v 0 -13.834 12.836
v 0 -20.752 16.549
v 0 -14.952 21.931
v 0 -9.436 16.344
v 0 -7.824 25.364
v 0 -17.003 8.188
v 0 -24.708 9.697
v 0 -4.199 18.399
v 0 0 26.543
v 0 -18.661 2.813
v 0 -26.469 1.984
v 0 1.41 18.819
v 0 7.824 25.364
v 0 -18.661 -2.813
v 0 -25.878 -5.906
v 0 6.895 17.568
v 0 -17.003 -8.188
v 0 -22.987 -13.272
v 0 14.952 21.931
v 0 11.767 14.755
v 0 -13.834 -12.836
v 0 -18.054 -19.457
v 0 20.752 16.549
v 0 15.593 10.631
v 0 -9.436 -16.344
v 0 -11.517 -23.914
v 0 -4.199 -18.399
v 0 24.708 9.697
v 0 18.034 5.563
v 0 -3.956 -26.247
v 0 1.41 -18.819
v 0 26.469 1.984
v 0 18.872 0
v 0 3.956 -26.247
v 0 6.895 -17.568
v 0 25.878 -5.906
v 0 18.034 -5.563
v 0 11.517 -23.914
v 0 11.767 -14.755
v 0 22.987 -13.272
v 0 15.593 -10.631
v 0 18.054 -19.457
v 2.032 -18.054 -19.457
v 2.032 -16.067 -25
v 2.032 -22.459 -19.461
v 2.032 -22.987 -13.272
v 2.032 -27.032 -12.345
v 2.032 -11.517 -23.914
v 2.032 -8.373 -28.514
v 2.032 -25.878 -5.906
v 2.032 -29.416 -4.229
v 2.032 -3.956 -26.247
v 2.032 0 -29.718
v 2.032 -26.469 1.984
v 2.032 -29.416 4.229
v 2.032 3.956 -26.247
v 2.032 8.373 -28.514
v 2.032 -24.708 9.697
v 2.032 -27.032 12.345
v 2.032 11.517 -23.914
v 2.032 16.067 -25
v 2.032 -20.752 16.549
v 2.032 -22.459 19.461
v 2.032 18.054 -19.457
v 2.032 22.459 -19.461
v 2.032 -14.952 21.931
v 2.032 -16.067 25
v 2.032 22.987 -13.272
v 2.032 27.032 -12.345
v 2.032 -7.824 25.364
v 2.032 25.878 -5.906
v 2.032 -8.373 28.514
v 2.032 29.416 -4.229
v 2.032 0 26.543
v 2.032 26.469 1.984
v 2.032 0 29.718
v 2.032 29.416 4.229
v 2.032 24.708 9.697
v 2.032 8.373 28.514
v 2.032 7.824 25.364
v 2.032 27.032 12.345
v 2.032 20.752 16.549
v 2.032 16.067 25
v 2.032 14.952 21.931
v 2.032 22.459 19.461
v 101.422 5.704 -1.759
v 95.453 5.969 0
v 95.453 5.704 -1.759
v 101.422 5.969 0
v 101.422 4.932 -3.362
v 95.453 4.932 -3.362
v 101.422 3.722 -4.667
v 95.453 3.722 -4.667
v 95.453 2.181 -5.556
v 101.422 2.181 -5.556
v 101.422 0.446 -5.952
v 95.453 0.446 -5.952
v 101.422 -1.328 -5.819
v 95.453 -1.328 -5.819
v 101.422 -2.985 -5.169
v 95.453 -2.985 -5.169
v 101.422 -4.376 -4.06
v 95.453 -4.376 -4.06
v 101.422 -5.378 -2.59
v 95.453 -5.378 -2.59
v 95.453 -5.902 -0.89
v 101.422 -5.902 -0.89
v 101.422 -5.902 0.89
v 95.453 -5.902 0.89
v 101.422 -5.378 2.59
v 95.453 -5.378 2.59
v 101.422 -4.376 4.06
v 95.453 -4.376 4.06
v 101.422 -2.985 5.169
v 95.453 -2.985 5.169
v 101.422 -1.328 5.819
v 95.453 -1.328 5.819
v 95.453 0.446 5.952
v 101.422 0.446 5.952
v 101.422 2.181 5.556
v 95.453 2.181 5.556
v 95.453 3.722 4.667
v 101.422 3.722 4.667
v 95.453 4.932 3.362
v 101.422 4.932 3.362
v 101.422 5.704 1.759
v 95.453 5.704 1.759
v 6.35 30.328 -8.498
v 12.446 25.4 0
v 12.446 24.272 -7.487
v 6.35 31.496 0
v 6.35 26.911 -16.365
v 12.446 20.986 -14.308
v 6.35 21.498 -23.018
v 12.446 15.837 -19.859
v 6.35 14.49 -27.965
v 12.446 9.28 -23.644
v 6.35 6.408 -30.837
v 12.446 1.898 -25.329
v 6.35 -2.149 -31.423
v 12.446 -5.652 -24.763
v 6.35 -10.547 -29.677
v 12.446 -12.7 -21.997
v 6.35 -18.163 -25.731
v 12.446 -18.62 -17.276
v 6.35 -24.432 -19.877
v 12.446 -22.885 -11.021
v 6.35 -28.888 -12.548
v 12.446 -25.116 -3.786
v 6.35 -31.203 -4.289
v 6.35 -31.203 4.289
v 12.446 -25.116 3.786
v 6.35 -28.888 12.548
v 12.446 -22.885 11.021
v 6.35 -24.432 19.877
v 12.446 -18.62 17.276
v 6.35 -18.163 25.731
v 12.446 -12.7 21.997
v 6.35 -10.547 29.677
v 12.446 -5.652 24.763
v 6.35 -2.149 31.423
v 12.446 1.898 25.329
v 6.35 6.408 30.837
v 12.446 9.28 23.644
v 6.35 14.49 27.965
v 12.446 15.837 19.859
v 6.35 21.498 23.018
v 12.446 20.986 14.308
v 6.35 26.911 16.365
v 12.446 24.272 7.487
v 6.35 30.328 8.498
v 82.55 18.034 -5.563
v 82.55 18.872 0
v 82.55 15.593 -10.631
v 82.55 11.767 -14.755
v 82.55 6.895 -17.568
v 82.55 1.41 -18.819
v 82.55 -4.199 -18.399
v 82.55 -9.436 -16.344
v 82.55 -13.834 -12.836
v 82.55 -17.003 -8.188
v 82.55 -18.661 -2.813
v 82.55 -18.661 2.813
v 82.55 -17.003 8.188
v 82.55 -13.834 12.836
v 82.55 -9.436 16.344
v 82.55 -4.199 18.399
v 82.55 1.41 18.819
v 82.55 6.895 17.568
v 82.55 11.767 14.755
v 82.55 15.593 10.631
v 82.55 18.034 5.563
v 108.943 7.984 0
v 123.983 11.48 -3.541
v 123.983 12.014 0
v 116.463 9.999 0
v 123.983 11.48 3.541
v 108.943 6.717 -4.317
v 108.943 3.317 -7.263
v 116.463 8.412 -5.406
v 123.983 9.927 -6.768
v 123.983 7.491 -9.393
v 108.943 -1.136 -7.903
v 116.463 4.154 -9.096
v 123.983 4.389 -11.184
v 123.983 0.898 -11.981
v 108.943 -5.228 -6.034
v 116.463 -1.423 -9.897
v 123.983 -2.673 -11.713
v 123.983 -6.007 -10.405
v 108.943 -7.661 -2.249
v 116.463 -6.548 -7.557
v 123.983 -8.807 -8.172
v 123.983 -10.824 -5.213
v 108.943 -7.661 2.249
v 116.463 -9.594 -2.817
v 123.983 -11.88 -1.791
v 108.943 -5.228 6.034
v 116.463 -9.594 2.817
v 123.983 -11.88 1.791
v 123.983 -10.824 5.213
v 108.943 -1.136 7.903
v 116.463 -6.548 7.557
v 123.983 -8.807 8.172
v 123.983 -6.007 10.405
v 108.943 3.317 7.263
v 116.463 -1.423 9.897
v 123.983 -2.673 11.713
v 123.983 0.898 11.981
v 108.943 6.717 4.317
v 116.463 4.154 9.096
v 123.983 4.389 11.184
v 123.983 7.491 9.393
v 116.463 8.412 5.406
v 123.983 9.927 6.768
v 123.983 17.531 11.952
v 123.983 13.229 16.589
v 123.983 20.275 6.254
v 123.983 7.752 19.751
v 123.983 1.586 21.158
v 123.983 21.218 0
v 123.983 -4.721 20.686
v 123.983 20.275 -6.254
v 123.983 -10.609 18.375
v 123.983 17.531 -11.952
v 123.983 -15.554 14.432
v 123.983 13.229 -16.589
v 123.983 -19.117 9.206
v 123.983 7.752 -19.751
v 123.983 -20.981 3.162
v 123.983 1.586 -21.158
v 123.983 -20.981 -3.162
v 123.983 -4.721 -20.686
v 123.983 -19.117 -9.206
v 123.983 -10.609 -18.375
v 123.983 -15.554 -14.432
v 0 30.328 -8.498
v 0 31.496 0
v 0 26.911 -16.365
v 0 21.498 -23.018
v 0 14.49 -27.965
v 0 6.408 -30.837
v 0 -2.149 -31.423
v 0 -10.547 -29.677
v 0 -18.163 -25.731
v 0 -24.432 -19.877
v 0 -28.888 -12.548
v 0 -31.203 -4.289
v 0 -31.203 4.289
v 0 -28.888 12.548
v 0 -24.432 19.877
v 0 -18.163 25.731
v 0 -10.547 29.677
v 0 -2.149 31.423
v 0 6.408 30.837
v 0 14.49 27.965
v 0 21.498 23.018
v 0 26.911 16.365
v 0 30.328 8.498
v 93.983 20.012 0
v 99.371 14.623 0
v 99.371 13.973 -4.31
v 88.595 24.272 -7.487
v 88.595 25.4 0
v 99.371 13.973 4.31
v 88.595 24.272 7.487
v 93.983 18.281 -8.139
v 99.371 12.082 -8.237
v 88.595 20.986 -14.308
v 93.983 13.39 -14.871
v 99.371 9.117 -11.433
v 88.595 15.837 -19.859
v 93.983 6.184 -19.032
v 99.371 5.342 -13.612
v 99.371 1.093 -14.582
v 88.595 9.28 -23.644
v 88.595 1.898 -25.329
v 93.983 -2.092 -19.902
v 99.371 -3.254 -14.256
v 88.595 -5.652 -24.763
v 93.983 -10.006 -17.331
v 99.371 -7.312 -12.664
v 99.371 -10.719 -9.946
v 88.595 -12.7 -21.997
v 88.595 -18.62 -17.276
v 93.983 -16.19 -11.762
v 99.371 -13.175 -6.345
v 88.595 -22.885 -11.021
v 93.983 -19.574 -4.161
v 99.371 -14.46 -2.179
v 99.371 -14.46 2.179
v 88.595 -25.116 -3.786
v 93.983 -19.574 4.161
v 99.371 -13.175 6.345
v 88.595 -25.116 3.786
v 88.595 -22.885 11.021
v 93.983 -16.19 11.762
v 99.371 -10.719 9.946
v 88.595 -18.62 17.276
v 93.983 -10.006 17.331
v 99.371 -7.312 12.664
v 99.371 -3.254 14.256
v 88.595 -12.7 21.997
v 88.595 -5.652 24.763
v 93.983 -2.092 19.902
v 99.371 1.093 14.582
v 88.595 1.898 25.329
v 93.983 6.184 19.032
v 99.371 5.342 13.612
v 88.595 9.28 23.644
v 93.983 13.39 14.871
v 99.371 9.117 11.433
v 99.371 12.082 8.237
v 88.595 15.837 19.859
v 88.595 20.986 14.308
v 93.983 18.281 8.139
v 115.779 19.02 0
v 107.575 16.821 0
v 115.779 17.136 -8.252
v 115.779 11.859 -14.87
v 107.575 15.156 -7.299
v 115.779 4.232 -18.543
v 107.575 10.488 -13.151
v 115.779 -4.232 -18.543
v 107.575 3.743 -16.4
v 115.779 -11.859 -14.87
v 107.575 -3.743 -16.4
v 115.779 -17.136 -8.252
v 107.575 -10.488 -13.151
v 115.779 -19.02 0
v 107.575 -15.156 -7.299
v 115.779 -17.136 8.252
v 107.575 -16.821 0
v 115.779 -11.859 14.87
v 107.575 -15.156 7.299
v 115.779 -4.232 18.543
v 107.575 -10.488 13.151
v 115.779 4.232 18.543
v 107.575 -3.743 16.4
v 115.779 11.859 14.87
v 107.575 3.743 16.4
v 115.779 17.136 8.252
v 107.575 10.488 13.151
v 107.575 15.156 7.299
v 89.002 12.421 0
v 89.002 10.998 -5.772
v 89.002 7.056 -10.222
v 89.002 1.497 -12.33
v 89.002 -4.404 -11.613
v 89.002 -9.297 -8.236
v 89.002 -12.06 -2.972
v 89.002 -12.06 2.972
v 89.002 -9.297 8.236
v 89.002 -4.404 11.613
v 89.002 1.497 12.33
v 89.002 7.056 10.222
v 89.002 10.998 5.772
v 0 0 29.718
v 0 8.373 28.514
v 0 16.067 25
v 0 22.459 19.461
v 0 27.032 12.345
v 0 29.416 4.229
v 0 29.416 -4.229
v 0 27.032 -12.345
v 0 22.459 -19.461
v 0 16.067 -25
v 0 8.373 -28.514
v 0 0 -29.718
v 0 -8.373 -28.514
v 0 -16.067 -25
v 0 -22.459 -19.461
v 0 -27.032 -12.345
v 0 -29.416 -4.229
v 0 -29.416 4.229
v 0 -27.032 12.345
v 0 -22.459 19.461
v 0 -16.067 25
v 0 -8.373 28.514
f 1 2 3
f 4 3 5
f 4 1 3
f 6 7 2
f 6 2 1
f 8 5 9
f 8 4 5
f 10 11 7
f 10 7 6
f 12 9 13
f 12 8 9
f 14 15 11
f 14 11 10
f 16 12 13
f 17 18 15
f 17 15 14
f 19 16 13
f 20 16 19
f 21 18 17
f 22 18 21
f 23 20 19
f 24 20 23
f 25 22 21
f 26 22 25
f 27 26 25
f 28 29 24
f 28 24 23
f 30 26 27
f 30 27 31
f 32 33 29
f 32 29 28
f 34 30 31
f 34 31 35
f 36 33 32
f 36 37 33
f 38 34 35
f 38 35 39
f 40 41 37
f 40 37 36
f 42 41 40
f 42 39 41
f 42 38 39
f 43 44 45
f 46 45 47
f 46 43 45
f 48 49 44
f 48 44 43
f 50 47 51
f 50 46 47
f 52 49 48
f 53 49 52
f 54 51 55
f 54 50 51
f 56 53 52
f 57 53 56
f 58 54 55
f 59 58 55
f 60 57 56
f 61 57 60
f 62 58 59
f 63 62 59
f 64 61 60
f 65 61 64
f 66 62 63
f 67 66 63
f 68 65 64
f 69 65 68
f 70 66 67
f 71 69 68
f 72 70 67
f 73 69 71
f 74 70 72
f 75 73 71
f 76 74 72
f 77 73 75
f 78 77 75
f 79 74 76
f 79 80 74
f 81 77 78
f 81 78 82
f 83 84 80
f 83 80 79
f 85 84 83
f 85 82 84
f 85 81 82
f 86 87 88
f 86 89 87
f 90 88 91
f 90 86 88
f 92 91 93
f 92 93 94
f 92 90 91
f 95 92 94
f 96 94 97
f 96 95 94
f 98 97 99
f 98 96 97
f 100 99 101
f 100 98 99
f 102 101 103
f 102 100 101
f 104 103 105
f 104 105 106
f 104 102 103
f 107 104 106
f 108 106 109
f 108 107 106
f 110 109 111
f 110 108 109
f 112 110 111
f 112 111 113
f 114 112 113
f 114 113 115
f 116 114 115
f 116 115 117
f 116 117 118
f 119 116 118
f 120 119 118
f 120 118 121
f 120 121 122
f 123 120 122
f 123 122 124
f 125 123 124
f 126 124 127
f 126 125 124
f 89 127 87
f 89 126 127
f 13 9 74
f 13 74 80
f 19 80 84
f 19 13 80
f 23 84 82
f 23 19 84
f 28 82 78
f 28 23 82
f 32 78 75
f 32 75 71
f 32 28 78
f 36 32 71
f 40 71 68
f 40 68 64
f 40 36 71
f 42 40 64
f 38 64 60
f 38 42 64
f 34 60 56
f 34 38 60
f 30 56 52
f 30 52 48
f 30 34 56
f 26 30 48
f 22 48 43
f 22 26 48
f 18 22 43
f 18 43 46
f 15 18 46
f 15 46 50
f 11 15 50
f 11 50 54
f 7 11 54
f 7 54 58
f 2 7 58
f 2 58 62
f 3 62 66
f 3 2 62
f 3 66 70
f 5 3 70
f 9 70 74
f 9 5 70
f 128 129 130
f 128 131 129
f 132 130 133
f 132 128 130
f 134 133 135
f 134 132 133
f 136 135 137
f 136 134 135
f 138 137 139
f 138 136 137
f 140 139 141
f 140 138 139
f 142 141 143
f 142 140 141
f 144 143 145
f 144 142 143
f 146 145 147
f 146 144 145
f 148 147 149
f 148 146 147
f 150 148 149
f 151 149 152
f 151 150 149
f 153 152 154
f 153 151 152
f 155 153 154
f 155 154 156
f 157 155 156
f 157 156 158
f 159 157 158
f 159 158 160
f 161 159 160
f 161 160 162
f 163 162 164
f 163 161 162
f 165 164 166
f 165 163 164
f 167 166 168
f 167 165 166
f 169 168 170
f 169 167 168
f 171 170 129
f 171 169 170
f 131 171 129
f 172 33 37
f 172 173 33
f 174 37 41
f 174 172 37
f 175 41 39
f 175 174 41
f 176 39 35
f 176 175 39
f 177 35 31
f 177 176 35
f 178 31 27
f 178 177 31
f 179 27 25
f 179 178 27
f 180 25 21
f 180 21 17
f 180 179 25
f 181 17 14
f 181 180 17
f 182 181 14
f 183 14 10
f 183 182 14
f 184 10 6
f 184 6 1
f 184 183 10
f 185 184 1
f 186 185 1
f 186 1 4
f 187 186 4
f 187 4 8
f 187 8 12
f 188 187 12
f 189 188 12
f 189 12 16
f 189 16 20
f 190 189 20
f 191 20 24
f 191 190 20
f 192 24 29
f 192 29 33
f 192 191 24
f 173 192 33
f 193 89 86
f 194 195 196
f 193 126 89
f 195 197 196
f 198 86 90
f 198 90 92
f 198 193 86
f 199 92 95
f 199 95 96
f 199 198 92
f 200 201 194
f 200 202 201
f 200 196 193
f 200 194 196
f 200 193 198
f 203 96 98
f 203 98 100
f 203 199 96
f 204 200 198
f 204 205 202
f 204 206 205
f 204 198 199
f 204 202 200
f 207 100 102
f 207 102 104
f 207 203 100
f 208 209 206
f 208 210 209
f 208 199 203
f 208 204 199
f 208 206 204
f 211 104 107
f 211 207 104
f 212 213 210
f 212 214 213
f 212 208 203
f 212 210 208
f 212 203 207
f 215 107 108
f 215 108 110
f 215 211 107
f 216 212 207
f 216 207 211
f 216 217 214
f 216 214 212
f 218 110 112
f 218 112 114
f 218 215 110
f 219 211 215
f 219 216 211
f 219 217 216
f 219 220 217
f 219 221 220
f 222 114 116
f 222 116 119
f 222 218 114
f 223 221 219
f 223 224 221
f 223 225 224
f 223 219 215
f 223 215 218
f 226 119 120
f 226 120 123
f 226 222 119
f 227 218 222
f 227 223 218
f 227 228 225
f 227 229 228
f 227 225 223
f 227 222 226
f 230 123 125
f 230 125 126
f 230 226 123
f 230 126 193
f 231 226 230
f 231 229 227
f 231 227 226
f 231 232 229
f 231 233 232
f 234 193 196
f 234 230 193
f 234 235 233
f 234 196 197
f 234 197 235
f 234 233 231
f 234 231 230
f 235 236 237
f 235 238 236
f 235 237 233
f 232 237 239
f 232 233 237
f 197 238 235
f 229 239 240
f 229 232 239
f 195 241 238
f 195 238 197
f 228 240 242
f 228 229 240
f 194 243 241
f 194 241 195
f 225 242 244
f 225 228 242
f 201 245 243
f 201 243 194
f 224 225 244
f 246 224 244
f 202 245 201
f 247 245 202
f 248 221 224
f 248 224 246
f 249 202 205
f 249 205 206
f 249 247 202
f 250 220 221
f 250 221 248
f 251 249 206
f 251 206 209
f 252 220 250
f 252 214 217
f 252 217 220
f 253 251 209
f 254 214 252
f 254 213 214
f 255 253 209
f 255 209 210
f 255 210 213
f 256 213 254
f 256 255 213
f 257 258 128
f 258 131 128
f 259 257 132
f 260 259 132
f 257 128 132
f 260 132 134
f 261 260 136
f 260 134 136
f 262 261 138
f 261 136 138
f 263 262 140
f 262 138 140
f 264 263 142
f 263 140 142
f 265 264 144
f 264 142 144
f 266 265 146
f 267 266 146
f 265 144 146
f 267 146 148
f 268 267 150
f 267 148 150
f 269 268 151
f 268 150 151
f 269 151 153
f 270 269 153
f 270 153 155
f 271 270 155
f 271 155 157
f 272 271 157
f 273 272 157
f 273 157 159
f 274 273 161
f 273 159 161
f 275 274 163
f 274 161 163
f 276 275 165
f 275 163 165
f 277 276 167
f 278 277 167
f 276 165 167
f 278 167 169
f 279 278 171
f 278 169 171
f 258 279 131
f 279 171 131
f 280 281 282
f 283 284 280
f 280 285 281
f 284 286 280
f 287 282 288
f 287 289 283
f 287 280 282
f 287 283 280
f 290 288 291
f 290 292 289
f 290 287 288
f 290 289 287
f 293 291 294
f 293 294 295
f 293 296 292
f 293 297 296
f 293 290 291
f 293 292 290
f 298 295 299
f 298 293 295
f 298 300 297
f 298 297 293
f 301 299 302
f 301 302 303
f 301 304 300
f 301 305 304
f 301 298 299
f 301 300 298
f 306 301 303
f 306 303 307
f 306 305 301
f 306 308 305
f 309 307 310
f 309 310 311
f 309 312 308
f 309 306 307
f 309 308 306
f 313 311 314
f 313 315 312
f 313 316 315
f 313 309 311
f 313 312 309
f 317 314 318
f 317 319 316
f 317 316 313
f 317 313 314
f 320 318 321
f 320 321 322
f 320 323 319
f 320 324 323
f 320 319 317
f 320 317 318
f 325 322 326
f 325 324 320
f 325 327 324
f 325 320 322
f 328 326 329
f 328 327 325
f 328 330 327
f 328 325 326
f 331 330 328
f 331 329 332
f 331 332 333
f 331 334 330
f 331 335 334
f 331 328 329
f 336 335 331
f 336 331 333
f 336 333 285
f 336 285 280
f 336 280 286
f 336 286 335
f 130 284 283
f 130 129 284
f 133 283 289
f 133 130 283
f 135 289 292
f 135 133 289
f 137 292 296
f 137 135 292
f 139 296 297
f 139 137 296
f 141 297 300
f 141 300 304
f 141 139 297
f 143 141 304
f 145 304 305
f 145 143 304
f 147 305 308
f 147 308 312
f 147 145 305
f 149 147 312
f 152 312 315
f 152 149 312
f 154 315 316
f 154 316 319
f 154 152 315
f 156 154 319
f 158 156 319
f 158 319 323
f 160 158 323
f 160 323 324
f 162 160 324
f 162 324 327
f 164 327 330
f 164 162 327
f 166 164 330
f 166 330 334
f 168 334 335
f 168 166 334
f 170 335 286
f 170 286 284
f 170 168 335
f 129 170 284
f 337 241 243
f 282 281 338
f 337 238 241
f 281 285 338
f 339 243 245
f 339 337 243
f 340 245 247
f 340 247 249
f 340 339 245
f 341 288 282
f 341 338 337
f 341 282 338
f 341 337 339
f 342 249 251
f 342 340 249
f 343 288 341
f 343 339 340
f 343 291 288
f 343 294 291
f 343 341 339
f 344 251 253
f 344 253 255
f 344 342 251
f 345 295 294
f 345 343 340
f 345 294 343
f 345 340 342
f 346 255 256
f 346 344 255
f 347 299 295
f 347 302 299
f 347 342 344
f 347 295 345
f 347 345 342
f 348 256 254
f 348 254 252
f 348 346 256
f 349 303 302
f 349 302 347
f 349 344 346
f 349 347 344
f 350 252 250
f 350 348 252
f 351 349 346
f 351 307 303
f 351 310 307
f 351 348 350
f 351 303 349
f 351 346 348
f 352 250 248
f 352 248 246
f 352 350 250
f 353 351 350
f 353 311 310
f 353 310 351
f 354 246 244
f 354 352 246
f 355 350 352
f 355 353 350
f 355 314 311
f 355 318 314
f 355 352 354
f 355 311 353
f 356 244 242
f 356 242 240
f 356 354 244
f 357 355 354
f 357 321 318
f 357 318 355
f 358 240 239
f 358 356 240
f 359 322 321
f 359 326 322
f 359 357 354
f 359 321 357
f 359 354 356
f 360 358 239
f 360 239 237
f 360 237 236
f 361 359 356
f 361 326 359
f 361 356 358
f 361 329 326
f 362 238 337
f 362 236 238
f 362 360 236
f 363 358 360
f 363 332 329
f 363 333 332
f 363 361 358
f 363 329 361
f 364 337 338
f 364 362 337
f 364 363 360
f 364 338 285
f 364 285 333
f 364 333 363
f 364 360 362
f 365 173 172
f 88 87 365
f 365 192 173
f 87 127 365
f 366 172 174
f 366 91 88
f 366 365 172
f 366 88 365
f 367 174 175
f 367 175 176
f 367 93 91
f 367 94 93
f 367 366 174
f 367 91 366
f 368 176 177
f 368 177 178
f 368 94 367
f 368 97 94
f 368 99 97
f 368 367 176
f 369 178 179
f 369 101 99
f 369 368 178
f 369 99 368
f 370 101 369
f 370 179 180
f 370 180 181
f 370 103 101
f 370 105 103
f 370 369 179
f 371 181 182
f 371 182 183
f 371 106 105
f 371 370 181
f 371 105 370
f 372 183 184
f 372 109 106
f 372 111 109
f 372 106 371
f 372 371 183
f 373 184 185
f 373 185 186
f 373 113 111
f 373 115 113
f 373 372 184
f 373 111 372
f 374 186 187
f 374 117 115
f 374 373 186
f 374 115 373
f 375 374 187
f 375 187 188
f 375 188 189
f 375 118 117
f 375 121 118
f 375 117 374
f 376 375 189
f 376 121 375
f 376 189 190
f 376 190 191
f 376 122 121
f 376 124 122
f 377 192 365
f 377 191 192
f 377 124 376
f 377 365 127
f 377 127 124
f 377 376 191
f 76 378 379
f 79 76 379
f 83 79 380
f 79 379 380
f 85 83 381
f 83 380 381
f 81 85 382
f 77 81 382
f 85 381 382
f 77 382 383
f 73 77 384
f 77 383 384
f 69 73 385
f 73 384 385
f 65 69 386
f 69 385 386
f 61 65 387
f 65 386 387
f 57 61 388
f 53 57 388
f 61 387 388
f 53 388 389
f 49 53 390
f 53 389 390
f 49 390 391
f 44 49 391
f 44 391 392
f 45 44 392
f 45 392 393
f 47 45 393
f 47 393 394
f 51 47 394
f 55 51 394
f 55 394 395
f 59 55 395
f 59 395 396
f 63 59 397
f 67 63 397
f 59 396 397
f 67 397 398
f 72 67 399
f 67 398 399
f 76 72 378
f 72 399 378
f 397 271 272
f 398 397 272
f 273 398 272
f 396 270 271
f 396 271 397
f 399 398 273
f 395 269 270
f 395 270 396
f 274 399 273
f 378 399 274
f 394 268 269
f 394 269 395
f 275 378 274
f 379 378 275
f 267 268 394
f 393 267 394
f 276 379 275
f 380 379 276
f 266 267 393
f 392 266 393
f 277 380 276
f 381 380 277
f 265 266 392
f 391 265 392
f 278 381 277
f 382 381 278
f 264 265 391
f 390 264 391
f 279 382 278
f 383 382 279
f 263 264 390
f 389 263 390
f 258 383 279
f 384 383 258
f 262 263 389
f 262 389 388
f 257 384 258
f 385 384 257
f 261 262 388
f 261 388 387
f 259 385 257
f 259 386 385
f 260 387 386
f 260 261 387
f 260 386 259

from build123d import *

# Parameters (mm, degrees)
SKETCH1_W          = 6.35
SKETCH1_H          = 6.096
SKETCH2_R          = 29.718
SKETCH2_R_2        = 26.543
CUT_EXTRUDE1_DEPTH = 2.032


with BuildPart() as part:
    # Sketch1 → Revolve1 (revolve)
    with BuildSketch(Plane.XY):
        Polygon((0, 25.4), (0, 18.8722), (82.55, 18.8722), (95.4532, 5.969), (101.4222, 5.969), (123.983193542, 12.0142), (123.983193542, 21.217805244), (99.371450104, 14.623108465), (88.594558569, 25.4), (12.446, 25.4), (6.35, 25.4), align=None)
        with Locations((3.175, 28.448)):
            Rectangle(SKETCH1_W, SKETCH1_H)
        Polygon((6.35, 31.496), (6.35, 25.4), (12.446, 25.4), align=None)
    revolve(axis=Axis((0, 0, 0), (-1, 0, 0)))

    # Sketch2 → Cut-Extrude1 (cut)
    with BuildSketch(Plane.ZY):
        Circle(SKETCH2_R)
        Circle(SKETCH2_R_2, mode=Mode.SUBTRACT)
    extrude(amount=-CUT_EXTRUDE1_DEPTH, mode=Mode.SUBTRACT)


solid = part.part
